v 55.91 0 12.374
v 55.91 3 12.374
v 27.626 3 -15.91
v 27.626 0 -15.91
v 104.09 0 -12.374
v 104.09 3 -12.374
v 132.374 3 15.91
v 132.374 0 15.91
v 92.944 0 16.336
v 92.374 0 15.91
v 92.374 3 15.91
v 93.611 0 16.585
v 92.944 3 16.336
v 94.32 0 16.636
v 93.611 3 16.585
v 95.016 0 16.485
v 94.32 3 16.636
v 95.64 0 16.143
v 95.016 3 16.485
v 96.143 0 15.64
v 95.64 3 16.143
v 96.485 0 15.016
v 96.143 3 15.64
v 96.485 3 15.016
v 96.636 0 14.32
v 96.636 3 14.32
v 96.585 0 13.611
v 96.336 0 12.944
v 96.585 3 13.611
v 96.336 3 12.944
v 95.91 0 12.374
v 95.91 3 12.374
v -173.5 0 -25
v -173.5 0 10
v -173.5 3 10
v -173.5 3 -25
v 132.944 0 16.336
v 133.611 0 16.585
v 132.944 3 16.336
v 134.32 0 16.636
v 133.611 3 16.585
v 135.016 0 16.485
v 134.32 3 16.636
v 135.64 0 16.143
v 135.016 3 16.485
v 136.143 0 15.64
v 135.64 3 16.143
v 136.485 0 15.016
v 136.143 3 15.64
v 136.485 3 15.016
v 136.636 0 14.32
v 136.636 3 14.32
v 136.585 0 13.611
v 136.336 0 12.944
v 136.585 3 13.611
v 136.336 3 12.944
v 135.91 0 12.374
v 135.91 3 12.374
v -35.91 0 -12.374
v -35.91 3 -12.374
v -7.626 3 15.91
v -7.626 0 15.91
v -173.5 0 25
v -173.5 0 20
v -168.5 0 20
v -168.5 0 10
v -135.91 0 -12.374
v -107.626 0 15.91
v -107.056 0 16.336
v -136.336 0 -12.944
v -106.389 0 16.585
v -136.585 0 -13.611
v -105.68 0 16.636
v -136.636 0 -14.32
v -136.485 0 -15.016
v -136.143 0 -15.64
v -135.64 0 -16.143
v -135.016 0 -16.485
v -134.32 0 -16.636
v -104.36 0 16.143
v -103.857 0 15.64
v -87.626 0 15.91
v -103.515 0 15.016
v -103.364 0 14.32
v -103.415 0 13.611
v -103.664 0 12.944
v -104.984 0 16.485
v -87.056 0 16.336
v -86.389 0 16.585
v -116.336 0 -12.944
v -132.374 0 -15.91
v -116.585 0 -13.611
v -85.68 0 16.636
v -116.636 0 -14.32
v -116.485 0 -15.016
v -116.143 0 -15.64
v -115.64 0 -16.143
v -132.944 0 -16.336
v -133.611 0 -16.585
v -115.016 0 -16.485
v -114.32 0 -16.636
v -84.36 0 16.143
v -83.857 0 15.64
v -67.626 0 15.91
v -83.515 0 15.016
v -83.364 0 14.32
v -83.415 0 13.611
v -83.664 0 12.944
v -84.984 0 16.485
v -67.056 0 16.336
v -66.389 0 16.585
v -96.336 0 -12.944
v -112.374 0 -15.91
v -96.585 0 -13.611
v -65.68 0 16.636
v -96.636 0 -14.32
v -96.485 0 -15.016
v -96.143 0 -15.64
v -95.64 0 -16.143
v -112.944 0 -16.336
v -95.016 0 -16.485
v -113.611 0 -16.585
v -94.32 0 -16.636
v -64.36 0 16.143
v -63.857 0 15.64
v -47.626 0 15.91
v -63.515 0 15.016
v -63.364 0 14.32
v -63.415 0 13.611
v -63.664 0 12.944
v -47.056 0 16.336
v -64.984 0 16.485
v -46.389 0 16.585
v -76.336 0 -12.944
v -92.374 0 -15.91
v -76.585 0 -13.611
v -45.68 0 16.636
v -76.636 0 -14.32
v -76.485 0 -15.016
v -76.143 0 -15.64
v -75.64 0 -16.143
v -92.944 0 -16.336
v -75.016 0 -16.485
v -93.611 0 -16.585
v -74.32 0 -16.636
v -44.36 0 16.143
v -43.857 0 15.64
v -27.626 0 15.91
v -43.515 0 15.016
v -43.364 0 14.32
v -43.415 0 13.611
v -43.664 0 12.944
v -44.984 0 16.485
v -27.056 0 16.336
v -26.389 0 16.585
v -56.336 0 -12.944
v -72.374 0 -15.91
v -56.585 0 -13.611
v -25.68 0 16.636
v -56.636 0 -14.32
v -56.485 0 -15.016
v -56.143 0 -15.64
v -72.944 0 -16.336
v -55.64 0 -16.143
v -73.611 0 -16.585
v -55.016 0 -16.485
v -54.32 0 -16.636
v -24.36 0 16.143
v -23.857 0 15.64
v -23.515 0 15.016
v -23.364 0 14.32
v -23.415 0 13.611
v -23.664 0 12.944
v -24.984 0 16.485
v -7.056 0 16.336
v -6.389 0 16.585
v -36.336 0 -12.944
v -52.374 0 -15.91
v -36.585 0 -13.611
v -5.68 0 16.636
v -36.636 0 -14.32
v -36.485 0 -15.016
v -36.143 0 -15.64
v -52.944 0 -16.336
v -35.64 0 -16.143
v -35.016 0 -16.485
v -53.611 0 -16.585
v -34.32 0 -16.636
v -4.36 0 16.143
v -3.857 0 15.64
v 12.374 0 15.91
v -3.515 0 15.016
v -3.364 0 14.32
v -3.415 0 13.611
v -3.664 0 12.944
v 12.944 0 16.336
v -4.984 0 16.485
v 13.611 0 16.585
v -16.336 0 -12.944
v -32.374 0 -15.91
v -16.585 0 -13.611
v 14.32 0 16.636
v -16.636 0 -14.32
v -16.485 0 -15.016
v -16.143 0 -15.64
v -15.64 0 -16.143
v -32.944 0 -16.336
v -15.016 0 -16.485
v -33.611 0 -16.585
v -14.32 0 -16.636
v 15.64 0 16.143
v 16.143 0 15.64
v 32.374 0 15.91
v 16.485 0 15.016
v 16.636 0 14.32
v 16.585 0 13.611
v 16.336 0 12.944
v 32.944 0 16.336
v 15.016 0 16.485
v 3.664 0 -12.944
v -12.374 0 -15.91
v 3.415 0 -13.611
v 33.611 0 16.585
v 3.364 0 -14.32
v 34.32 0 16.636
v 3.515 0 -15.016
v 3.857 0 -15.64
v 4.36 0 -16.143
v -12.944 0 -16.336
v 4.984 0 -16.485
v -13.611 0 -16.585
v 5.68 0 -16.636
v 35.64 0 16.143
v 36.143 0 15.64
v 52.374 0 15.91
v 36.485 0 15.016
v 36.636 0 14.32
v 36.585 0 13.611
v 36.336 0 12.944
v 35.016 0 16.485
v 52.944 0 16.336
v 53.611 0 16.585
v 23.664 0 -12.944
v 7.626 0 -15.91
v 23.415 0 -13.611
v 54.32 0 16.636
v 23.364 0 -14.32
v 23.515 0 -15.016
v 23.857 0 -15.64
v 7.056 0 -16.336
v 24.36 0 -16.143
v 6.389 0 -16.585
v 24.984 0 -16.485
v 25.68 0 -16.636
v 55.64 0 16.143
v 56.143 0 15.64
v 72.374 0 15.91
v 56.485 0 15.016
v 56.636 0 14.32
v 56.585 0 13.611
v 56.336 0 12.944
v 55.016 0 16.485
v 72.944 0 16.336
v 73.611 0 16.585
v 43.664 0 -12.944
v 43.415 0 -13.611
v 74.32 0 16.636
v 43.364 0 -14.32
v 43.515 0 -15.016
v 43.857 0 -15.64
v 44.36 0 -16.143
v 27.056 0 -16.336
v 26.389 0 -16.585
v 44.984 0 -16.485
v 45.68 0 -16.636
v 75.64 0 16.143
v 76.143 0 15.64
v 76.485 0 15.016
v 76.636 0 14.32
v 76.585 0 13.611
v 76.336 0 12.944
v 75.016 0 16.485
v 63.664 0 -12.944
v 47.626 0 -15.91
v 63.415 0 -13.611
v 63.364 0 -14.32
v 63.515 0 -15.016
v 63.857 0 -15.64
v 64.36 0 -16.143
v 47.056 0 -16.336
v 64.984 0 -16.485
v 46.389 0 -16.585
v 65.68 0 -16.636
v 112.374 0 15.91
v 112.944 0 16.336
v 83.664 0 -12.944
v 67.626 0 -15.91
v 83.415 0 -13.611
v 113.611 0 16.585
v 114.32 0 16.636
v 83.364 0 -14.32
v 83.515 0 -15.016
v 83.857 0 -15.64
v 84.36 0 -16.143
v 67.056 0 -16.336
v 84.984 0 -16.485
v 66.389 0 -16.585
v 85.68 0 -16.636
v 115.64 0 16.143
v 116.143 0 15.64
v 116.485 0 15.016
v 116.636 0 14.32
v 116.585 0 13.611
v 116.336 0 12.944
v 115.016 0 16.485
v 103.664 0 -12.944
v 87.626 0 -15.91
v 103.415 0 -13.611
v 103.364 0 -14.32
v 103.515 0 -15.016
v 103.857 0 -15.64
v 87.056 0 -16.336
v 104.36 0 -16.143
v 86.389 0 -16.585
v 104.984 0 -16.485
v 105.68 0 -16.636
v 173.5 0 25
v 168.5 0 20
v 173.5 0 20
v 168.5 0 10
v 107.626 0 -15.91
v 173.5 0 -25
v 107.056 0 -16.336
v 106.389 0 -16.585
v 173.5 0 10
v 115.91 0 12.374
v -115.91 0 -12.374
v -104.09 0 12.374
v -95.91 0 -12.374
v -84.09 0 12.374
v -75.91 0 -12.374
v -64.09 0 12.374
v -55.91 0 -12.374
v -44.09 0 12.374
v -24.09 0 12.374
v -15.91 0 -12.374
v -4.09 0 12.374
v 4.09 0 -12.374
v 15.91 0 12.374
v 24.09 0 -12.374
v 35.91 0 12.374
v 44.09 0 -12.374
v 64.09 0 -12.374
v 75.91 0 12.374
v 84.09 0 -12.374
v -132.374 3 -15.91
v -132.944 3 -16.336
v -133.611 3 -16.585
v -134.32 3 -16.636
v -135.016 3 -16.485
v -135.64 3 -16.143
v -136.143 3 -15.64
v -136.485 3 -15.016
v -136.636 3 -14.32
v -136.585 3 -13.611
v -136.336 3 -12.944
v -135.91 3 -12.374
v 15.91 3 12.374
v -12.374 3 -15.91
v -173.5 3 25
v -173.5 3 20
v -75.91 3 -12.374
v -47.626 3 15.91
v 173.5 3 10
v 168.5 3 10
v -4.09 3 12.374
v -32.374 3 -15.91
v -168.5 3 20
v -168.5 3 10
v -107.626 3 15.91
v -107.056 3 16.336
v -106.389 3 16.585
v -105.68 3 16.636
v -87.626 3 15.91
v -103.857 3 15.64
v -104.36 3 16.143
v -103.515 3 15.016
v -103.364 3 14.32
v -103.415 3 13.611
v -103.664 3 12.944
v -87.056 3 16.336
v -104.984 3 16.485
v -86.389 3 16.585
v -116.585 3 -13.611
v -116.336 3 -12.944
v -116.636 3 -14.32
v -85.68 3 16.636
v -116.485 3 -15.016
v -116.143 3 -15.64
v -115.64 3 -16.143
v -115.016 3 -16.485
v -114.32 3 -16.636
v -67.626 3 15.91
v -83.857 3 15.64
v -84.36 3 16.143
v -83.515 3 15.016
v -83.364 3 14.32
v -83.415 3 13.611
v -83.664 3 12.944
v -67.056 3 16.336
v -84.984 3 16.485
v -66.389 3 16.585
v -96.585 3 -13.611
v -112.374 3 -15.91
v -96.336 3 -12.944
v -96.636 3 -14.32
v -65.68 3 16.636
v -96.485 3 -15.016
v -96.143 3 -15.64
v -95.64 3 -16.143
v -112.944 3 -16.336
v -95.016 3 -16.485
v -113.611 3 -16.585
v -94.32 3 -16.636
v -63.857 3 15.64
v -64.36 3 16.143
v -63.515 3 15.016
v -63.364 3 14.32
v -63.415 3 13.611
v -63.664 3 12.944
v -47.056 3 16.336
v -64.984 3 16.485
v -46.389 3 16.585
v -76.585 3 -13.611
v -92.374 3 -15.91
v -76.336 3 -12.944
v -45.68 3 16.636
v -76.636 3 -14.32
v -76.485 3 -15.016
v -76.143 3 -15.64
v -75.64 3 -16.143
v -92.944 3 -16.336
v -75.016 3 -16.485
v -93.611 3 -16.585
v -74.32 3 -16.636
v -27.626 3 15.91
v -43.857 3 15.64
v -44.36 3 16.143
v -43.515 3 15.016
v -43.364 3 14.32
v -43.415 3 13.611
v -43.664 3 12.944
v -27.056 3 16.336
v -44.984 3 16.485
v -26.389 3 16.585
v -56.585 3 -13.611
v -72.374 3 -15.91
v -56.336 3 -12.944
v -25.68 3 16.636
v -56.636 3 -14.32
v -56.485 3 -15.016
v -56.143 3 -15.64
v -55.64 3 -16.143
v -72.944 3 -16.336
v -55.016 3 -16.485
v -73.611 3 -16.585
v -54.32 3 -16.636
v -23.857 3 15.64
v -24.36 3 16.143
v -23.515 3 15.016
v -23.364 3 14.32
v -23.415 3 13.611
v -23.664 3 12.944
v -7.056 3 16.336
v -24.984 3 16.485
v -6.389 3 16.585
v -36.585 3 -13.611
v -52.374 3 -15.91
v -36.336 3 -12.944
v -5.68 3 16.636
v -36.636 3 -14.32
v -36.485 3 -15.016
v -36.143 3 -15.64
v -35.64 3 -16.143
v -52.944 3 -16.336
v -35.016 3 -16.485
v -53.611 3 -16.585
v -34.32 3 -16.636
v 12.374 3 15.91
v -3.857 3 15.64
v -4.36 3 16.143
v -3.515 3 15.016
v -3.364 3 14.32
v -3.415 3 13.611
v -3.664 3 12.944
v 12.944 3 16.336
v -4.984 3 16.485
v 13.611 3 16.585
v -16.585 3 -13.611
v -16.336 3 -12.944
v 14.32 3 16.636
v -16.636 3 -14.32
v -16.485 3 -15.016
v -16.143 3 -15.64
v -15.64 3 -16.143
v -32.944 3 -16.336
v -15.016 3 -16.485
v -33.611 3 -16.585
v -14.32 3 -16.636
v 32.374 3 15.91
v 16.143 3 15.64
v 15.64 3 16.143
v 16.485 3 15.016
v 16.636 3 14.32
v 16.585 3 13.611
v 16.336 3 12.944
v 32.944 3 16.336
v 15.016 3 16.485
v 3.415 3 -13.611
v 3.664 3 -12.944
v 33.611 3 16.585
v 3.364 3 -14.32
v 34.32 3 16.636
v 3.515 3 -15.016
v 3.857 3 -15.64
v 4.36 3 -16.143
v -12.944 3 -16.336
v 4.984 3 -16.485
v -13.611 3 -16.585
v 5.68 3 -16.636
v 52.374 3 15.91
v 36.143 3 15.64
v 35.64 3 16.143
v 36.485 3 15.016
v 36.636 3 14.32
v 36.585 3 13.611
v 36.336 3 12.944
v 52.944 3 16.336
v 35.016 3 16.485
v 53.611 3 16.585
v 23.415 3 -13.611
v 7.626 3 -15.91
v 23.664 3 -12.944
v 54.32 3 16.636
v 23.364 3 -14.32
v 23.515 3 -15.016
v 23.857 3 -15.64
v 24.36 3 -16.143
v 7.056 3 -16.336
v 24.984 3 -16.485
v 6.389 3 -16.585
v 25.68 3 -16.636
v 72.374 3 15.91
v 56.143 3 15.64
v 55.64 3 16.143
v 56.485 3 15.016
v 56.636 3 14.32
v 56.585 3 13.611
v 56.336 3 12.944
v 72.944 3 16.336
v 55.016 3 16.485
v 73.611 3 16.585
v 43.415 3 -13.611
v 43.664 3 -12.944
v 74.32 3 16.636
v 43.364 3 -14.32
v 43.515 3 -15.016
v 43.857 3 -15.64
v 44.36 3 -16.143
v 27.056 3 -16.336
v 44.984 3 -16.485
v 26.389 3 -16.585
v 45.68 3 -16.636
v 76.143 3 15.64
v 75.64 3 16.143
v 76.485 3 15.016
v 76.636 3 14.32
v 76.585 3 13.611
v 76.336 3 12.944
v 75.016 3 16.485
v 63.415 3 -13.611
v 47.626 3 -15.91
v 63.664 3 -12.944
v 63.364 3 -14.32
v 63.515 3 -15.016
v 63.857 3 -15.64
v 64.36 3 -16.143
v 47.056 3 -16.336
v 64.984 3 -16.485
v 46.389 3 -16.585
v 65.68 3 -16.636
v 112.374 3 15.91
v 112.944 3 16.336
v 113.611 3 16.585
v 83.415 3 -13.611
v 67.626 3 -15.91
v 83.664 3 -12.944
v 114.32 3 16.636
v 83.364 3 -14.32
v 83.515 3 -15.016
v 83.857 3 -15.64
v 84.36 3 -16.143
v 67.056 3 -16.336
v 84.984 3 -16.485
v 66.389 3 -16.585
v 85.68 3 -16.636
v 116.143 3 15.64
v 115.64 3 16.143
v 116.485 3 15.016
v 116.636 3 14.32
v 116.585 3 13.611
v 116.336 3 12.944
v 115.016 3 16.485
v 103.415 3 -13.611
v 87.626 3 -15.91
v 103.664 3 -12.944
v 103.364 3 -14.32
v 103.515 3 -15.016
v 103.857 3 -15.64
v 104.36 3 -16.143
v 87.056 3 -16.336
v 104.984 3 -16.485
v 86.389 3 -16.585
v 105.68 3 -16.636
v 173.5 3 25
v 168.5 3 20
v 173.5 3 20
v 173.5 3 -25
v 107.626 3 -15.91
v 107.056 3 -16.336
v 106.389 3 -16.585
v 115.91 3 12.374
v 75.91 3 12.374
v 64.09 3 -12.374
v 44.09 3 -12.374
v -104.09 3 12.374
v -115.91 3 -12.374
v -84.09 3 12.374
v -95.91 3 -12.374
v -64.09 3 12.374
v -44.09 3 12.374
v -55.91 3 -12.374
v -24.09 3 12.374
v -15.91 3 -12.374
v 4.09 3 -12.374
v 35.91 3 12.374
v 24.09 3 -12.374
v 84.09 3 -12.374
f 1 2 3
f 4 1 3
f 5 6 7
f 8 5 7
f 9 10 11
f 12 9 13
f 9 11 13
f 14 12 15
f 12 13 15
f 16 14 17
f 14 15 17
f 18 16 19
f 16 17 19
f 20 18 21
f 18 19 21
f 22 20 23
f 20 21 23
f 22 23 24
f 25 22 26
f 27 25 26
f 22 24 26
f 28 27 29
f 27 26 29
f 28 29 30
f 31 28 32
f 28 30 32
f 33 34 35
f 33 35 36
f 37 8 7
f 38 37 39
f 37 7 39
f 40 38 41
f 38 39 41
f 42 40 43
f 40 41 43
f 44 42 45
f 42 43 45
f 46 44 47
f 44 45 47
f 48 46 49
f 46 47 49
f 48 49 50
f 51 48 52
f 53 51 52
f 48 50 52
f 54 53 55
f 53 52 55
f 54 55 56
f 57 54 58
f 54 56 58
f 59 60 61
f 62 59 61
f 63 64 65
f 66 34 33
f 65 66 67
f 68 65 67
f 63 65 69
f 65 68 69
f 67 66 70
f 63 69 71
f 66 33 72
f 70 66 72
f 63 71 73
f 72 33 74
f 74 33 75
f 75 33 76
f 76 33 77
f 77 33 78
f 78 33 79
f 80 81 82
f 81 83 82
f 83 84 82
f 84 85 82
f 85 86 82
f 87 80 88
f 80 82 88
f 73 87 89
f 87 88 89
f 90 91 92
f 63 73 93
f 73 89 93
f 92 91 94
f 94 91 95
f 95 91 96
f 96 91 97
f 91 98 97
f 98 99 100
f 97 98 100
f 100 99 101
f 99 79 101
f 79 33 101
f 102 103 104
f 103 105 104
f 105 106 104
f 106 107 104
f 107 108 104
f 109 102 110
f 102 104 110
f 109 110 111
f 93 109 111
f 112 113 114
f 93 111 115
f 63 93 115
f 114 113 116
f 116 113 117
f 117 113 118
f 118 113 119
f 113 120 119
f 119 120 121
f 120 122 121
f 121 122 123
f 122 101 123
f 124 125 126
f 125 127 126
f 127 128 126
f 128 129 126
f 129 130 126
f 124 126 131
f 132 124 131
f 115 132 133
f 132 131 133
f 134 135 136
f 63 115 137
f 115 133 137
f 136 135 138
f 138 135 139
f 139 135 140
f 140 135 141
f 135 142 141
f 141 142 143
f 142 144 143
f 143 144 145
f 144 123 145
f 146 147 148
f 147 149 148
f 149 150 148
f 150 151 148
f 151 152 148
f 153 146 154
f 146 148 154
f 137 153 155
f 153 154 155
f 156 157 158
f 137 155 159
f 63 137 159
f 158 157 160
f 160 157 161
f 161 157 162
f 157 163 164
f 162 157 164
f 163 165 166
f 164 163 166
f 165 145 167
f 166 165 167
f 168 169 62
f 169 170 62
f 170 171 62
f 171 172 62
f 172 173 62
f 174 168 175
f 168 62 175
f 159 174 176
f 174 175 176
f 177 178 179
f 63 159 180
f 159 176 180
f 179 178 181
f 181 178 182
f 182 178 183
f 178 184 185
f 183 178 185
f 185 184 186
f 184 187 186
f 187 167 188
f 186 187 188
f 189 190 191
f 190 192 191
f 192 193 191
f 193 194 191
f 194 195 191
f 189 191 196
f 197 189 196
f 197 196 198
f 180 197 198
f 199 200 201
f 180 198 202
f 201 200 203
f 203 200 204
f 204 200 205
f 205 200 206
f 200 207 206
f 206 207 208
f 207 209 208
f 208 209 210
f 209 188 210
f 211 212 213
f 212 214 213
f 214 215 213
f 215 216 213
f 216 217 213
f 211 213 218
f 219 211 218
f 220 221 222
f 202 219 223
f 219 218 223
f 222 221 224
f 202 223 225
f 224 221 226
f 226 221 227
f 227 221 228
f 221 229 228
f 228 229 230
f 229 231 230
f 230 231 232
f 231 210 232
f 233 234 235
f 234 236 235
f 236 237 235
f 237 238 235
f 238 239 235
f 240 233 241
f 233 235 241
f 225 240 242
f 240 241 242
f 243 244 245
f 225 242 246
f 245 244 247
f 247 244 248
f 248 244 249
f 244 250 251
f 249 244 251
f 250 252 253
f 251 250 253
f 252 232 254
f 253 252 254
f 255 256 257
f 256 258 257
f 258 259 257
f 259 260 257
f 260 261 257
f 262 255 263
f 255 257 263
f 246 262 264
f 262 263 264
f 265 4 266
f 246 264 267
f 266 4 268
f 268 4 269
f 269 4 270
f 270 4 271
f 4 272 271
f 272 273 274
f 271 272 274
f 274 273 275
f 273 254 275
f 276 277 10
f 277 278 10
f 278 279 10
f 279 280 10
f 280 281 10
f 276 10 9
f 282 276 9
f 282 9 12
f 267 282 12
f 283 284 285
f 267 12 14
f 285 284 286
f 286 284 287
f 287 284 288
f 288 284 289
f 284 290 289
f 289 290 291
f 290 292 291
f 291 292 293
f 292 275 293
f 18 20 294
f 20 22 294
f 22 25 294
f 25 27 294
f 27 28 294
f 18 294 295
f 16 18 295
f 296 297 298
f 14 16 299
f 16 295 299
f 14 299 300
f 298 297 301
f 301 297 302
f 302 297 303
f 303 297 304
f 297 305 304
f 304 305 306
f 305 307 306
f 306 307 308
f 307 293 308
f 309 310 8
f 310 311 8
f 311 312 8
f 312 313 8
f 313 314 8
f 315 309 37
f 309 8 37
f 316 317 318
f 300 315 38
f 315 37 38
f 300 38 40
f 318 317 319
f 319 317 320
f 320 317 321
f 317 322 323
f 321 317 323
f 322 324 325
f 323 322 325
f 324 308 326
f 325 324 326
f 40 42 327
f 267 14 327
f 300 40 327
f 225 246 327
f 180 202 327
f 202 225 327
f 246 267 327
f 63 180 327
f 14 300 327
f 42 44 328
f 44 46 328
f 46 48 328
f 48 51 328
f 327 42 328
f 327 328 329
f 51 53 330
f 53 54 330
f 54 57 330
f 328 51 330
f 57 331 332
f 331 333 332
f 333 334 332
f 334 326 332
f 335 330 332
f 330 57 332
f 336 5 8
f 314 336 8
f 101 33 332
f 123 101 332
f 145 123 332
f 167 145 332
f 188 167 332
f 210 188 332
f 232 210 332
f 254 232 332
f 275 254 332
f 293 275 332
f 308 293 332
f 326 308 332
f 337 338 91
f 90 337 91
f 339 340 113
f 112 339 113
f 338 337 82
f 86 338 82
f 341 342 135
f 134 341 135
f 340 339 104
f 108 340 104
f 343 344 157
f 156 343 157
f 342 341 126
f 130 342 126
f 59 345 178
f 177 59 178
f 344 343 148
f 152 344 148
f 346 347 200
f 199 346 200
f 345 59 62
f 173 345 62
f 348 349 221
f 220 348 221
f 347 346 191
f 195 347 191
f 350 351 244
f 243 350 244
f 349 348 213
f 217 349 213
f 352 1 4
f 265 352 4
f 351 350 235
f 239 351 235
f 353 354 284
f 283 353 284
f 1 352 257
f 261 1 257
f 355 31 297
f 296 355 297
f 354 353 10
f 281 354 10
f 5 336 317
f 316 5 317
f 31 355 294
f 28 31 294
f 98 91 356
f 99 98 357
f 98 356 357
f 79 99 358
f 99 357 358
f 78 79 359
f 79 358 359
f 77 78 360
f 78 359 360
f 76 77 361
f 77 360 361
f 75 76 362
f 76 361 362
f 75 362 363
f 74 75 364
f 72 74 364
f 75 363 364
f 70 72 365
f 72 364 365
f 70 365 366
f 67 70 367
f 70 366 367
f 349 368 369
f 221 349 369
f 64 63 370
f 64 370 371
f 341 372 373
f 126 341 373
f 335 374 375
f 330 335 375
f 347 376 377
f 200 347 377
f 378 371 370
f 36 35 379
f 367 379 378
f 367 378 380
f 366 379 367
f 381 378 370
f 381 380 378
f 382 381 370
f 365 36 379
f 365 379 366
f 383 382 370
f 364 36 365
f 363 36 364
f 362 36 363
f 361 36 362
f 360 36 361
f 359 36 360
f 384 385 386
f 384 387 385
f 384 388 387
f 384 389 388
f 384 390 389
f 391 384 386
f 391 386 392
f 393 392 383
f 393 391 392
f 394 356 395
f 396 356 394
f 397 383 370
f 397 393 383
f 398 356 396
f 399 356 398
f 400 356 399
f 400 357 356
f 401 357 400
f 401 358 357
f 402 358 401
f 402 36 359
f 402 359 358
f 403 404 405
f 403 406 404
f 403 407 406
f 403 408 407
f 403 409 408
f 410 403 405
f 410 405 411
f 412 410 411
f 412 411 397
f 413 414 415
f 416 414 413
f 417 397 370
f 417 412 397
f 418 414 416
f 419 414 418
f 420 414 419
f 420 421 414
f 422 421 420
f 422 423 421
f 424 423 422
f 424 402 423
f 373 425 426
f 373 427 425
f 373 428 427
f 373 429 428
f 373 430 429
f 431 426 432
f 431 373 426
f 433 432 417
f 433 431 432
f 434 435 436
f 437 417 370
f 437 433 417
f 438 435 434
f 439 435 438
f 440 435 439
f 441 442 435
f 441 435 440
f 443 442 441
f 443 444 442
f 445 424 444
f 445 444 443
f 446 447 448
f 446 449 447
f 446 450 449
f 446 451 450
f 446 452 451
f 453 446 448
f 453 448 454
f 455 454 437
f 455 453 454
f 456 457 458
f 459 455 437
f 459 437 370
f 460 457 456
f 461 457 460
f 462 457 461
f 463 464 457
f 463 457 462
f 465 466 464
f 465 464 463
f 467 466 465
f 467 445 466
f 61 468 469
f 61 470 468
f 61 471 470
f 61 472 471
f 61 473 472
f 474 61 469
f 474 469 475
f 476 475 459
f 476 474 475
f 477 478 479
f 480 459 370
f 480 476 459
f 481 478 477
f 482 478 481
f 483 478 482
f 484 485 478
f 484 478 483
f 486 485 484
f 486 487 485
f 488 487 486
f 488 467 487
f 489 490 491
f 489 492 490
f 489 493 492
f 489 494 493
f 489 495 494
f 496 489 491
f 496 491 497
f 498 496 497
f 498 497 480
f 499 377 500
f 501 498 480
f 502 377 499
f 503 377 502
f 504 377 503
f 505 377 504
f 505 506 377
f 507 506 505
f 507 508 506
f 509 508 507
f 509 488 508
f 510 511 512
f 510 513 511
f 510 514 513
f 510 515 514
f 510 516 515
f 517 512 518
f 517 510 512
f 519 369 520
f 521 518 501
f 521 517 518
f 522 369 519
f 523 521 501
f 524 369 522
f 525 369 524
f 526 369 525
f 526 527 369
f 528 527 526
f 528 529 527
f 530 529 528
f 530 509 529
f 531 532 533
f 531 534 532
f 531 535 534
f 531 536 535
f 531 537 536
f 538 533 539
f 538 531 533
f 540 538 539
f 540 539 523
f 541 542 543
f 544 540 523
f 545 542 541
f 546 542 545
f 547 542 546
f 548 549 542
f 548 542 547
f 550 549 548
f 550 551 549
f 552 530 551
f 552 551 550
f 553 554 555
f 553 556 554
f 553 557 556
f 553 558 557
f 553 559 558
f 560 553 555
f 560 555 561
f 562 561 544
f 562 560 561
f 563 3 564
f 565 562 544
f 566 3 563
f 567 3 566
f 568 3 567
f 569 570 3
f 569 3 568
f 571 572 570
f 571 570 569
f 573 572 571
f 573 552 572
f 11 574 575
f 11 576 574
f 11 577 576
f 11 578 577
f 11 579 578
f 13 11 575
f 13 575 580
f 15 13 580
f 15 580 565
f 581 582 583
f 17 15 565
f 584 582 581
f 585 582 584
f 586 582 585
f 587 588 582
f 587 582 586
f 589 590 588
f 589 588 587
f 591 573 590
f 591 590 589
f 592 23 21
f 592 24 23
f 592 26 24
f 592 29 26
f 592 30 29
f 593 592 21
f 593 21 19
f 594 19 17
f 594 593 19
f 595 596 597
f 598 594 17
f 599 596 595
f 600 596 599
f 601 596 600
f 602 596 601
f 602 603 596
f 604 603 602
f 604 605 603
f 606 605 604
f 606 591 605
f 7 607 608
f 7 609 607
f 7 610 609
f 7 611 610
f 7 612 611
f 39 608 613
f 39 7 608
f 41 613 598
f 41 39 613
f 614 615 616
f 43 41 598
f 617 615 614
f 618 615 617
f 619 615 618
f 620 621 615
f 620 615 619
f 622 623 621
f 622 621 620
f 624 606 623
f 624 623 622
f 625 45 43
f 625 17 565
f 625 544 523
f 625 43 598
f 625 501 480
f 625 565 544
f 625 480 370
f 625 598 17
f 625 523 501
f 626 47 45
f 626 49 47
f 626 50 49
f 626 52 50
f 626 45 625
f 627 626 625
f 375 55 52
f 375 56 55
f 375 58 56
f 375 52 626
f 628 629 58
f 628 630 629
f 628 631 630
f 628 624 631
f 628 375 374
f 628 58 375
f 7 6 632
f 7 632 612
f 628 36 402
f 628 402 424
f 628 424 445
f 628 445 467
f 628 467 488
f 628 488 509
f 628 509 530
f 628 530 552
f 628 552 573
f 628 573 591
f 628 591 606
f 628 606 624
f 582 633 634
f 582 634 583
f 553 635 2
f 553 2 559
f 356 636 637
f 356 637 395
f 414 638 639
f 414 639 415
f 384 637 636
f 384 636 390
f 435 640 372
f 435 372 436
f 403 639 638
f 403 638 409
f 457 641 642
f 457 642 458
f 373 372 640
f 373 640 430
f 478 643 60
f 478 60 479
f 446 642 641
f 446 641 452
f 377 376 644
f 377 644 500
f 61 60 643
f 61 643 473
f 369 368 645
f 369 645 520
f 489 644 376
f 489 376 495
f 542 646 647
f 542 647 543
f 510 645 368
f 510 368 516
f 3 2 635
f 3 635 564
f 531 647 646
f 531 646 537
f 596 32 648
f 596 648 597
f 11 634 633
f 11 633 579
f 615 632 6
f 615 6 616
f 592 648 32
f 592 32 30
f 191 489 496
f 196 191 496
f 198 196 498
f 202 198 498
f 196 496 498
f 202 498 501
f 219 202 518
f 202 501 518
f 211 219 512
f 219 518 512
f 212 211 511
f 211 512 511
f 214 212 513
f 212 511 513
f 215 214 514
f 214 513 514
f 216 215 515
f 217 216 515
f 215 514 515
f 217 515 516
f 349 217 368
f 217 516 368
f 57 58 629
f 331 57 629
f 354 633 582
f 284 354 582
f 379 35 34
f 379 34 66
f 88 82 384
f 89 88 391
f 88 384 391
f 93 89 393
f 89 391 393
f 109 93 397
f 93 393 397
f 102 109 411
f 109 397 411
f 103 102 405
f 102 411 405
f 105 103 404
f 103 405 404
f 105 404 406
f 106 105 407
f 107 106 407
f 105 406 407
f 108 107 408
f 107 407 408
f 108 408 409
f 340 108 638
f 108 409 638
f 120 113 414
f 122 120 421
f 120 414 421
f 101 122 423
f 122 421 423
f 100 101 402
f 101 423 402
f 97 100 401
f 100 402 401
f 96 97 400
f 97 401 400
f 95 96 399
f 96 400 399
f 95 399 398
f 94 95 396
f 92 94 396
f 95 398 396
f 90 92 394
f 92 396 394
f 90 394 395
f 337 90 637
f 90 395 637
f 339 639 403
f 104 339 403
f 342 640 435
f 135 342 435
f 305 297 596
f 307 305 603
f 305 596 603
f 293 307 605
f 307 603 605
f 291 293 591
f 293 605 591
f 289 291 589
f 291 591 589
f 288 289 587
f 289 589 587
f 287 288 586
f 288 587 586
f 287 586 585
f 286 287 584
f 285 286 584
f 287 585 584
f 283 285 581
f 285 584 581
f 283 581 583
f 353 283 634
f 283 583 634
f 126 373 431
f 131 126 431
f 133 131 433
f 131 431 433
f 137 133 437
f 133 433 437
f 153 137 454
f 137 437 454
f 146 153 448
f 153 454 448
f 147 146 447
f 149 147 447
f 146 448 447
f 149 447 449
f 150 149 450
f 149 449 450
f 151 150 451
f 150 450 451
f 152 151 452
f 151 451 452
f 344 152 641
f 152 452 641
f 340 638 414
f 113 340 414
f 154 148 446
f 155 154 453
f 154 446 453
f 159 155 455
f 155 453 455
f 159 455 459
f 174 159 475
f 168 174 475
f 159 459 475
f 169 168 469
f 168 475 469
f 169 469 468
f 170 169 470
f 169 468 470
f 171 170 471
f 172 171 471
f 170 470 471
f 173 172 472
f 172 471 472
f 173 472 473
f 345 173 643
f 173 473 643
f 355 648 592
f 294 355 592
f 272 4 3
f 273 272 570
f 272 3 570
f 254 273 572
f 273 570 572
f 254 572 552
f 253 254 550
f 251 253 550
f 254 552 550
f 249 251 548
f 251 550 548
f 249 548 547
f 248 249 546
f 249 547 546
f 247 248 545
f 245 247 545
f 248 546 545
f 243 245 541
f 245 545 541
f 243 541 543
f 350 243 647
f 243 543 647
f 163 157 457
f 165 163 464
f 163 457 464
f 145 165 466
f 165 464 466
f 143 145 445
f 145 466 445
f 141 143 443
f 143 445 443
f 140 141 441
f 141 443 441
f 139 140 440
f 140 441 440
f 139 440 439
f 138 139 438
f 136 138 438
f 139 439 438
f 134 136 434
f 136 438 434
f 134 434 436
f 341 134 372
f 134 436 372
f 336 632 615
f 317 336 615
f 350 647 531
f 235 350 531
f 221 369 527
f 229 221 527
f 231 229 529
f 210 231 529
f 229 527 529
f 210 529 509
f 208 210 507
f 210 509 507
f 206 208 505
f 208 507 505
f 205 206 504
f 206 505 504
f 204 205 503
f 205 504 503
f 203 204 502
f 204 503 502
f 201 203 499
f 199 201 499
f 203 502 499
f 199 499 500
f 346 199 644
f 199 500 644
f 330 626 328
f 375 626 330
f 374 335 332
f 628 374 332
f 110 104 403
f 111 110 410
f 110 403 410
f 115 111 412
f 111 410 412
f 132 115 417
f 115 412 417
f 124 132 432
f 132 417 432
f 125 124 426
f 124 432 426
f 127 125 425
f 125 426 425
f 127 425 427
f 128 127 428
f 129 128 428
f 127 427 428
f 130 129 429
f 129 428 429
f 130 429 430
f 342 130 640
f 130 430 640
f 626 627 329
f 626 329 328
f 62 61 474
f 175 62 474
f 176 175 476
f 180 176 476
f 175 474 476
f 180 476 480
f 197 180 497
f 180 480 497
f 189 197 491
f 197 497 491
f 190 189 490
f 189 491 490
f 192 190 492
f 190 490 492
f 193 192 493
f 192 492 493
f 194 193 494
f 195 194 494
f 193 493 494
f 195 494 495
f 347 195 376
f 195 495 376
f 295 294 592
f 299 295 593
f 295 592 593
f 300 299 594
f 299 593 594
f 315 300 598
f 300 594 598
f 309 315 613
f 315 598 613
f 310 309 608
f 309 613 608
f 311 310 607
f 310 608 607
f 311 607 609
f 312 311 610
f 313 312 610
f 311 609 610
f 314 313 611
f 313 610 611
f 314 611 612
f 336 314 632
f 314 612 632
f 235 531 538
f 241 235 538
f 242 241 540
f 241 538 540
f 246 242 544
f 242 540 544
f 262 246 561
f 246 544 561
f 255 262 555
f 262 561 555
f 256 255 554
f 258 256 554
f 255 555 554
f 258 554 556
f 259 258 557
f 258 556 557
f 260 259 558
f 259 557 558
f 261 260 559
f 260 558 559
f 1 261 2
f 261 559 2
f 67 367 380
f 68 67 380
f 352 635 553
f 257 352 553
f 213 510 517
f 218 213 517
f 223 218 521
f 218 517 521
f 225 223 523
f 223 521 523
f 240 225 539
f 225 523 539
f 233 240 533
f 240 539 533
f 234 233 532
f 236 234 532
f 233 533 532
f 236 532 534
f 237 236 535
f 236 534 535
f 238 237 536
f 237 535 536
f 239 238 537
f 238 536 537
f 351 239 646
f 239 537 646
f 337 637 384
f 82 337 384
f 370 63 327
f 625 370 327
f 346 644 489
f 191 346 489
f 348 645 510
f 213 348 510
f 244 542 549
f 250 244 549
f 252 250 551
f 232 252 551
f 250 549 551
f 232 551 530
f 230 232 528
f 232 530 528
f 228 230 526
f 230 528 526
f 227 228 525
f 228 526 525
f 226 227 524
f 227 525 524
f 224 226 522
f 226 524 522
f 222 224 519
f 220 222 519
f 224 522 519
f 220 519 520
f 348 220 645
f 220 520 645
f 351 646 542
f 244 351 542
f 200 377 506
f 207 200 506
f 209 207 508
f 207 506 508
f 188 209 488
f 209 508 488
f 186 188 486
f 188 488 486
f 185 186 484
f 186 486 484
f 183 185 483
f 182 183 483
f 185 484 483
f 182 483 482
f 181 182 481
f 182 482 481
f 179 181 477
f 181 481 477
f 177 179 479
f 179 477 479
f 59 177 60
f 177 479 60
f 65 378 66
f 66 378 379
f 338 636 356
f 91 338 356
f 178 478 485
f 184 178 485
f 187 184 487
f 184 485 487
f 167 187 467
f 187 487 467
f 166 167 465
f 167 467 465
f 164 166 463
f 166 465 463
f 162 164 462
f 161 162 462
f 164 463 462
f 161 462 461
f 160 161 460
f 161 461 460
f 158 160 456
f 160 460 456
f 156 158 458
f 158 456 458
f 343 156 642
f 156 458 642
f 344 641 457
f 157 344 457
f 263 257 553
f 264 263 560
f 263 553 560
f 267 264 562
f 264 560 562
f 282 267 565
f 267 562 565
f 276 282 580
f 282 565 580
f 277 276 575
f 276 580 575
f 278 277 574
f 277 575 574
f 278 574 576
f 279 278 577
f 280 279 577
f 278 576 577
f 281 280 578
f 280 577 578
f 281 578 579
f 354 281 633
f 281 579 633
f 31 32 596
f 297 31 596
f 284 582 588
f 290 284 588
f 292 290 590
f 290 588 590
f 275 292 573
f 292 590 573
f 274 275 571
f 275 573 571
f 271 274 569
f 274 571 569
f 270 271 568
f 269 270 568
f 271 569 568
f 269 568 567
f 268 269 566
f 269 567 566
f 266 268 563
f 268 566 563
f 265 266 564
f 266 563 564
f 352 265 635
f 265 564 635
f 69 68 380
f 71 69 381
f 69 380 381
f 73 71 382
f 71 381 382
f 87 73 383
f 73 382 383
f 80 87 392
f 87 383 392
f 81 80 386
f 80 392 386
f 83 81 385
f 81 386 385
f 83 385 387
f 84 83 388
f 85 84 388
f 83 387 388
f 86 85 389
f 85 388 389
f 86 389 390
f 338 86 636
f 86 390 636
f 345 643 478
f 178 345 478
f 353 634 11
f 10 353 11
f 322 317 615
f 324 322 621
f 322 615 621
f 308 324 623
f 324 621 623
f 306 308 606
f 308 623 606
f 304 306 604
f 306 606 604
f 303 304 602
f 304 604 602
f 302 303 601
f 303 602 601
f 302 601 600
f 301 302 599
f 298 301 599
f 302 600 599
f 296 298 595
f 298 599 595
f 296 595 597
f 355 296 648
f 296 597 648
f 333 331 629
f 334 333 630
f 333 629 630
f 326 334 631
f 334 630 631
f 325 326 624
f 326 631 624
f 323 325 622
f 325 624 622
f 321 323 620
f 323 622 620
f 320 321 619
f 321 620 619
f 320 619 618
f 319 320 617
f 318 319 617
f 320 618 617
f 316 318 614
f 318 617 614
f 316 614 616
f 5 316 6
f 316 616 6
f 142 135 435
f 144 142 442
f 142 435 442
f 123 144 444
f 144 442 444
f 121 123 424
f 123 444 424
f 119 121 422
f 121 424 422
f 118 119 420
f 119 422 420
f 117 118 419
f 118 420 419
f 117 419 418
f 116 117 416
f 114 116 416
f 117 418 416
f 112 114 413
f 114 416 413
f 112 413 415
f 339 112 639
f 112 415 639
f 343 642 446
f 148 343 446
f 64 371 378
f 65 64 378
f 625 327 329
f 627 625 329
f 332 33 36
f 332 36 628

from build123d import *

# Parameters (mm, degrees)
SKETCH1_W           = 347
SKETCH1_H           = 50
EXTRUDE1_DEPTH      = 3
EXTRUDE2_DEPTH      = 176.317569
LPATTERN1_COUNT     = 7
LPATTERN1_PITCH     = 20
LPATTERN1_COL_COUNT = 7
LPATTERN1_COL_PITCH = 20
EXTRUDE3_REACH      = 177.318
SKETCH3_W           = 5
SKETCH3_H           = 10


with BuildPart() as part:
    # Sketch1 → Extrude1 (new body)
    with BuildSketch(Plane(origin=(0, 0, 0), x_dir=(1, 0, 0), z_dir=(0, 1, 0))):
        Rectangle(SKETCH1_W, SKETCH1_H)
    extrude(amount=EXTRUDE1_DEPTH)

    # Sketch2 → Extrude2 (cut, through all)
    with BuildSketch(Plane(origin=(0, 3, 0), x_dir=(1, 0, 0), z_dir=(0, 1, 0))):
        with BuildLine():
            Line((15.909902577, -12.374368671), (-12.374368671, 15.909902577))
            ThreePointArc((-12.374368671, 15.909902577), (-15.909902577, 15.909902577), (-15.909902577, 12.374368671))
            Line((-15.909902577, 12.374368671), (12.374368671, -15.909902577))
            ThreePointArc((12.374368671, -15.909902577), (15.909902577, -15.909902577), (15.909902577, -12.374368671))
        make_face()
    extrude2 = extrude(amount=-EXTRUDE2_DEPTH, mode=Mode.SUBTRACT)

    # LPattern1: Extrude2 ×7
    with Locations(*[(i * LPATTERN1_PITCH, 0, 0) for i in range(1, LPATTERN1_COUNT)]):
        add(extrude2, mode=Mode.SUBTRACT)

    # LPattern1 col: Extrude2 ×7
    with Locations(*[(-i * LPATTERN1_COL_PITCH, 0, 0) for i in range(1, LPATTERN1_COL_COUNT)]):
        add(extrude2, mode=Mode.SUBTRACT)

    # Sketch3 → Extrude3 (cut, up to next)
    with BuildSketch(Plane(origin=(0, 3, 0), x_dir=(1, 0, 0), z_dir=(0, 1, 0)), mode=Mode.PRIVATE) as extrude3_sk1:
        with Locations((-171, -15)):
            Rectangle(SKETCH3_W, SKETCH3_H)
    extrude3_tool1 = extrude(extrude3_sk1.sketch, amount=-EXTRUDE3_REACH, mode=Mode.PRIVATE) & part.part
    extrude3 = extrude3_tool1.solids().sort_by_distance((-171, 3, 15))[0]
    add(extrude3, mode=Mode.SUBTRACT)

    # Mirror1: Extrude3 across plane
    add(extrude3.mirror(Plane(origin=(0, 0, 0), x_dir=(0, 0, 1), z_dir=(1, 0, 0))), mode=Mode.SUBTRACT)


solid = part.part
